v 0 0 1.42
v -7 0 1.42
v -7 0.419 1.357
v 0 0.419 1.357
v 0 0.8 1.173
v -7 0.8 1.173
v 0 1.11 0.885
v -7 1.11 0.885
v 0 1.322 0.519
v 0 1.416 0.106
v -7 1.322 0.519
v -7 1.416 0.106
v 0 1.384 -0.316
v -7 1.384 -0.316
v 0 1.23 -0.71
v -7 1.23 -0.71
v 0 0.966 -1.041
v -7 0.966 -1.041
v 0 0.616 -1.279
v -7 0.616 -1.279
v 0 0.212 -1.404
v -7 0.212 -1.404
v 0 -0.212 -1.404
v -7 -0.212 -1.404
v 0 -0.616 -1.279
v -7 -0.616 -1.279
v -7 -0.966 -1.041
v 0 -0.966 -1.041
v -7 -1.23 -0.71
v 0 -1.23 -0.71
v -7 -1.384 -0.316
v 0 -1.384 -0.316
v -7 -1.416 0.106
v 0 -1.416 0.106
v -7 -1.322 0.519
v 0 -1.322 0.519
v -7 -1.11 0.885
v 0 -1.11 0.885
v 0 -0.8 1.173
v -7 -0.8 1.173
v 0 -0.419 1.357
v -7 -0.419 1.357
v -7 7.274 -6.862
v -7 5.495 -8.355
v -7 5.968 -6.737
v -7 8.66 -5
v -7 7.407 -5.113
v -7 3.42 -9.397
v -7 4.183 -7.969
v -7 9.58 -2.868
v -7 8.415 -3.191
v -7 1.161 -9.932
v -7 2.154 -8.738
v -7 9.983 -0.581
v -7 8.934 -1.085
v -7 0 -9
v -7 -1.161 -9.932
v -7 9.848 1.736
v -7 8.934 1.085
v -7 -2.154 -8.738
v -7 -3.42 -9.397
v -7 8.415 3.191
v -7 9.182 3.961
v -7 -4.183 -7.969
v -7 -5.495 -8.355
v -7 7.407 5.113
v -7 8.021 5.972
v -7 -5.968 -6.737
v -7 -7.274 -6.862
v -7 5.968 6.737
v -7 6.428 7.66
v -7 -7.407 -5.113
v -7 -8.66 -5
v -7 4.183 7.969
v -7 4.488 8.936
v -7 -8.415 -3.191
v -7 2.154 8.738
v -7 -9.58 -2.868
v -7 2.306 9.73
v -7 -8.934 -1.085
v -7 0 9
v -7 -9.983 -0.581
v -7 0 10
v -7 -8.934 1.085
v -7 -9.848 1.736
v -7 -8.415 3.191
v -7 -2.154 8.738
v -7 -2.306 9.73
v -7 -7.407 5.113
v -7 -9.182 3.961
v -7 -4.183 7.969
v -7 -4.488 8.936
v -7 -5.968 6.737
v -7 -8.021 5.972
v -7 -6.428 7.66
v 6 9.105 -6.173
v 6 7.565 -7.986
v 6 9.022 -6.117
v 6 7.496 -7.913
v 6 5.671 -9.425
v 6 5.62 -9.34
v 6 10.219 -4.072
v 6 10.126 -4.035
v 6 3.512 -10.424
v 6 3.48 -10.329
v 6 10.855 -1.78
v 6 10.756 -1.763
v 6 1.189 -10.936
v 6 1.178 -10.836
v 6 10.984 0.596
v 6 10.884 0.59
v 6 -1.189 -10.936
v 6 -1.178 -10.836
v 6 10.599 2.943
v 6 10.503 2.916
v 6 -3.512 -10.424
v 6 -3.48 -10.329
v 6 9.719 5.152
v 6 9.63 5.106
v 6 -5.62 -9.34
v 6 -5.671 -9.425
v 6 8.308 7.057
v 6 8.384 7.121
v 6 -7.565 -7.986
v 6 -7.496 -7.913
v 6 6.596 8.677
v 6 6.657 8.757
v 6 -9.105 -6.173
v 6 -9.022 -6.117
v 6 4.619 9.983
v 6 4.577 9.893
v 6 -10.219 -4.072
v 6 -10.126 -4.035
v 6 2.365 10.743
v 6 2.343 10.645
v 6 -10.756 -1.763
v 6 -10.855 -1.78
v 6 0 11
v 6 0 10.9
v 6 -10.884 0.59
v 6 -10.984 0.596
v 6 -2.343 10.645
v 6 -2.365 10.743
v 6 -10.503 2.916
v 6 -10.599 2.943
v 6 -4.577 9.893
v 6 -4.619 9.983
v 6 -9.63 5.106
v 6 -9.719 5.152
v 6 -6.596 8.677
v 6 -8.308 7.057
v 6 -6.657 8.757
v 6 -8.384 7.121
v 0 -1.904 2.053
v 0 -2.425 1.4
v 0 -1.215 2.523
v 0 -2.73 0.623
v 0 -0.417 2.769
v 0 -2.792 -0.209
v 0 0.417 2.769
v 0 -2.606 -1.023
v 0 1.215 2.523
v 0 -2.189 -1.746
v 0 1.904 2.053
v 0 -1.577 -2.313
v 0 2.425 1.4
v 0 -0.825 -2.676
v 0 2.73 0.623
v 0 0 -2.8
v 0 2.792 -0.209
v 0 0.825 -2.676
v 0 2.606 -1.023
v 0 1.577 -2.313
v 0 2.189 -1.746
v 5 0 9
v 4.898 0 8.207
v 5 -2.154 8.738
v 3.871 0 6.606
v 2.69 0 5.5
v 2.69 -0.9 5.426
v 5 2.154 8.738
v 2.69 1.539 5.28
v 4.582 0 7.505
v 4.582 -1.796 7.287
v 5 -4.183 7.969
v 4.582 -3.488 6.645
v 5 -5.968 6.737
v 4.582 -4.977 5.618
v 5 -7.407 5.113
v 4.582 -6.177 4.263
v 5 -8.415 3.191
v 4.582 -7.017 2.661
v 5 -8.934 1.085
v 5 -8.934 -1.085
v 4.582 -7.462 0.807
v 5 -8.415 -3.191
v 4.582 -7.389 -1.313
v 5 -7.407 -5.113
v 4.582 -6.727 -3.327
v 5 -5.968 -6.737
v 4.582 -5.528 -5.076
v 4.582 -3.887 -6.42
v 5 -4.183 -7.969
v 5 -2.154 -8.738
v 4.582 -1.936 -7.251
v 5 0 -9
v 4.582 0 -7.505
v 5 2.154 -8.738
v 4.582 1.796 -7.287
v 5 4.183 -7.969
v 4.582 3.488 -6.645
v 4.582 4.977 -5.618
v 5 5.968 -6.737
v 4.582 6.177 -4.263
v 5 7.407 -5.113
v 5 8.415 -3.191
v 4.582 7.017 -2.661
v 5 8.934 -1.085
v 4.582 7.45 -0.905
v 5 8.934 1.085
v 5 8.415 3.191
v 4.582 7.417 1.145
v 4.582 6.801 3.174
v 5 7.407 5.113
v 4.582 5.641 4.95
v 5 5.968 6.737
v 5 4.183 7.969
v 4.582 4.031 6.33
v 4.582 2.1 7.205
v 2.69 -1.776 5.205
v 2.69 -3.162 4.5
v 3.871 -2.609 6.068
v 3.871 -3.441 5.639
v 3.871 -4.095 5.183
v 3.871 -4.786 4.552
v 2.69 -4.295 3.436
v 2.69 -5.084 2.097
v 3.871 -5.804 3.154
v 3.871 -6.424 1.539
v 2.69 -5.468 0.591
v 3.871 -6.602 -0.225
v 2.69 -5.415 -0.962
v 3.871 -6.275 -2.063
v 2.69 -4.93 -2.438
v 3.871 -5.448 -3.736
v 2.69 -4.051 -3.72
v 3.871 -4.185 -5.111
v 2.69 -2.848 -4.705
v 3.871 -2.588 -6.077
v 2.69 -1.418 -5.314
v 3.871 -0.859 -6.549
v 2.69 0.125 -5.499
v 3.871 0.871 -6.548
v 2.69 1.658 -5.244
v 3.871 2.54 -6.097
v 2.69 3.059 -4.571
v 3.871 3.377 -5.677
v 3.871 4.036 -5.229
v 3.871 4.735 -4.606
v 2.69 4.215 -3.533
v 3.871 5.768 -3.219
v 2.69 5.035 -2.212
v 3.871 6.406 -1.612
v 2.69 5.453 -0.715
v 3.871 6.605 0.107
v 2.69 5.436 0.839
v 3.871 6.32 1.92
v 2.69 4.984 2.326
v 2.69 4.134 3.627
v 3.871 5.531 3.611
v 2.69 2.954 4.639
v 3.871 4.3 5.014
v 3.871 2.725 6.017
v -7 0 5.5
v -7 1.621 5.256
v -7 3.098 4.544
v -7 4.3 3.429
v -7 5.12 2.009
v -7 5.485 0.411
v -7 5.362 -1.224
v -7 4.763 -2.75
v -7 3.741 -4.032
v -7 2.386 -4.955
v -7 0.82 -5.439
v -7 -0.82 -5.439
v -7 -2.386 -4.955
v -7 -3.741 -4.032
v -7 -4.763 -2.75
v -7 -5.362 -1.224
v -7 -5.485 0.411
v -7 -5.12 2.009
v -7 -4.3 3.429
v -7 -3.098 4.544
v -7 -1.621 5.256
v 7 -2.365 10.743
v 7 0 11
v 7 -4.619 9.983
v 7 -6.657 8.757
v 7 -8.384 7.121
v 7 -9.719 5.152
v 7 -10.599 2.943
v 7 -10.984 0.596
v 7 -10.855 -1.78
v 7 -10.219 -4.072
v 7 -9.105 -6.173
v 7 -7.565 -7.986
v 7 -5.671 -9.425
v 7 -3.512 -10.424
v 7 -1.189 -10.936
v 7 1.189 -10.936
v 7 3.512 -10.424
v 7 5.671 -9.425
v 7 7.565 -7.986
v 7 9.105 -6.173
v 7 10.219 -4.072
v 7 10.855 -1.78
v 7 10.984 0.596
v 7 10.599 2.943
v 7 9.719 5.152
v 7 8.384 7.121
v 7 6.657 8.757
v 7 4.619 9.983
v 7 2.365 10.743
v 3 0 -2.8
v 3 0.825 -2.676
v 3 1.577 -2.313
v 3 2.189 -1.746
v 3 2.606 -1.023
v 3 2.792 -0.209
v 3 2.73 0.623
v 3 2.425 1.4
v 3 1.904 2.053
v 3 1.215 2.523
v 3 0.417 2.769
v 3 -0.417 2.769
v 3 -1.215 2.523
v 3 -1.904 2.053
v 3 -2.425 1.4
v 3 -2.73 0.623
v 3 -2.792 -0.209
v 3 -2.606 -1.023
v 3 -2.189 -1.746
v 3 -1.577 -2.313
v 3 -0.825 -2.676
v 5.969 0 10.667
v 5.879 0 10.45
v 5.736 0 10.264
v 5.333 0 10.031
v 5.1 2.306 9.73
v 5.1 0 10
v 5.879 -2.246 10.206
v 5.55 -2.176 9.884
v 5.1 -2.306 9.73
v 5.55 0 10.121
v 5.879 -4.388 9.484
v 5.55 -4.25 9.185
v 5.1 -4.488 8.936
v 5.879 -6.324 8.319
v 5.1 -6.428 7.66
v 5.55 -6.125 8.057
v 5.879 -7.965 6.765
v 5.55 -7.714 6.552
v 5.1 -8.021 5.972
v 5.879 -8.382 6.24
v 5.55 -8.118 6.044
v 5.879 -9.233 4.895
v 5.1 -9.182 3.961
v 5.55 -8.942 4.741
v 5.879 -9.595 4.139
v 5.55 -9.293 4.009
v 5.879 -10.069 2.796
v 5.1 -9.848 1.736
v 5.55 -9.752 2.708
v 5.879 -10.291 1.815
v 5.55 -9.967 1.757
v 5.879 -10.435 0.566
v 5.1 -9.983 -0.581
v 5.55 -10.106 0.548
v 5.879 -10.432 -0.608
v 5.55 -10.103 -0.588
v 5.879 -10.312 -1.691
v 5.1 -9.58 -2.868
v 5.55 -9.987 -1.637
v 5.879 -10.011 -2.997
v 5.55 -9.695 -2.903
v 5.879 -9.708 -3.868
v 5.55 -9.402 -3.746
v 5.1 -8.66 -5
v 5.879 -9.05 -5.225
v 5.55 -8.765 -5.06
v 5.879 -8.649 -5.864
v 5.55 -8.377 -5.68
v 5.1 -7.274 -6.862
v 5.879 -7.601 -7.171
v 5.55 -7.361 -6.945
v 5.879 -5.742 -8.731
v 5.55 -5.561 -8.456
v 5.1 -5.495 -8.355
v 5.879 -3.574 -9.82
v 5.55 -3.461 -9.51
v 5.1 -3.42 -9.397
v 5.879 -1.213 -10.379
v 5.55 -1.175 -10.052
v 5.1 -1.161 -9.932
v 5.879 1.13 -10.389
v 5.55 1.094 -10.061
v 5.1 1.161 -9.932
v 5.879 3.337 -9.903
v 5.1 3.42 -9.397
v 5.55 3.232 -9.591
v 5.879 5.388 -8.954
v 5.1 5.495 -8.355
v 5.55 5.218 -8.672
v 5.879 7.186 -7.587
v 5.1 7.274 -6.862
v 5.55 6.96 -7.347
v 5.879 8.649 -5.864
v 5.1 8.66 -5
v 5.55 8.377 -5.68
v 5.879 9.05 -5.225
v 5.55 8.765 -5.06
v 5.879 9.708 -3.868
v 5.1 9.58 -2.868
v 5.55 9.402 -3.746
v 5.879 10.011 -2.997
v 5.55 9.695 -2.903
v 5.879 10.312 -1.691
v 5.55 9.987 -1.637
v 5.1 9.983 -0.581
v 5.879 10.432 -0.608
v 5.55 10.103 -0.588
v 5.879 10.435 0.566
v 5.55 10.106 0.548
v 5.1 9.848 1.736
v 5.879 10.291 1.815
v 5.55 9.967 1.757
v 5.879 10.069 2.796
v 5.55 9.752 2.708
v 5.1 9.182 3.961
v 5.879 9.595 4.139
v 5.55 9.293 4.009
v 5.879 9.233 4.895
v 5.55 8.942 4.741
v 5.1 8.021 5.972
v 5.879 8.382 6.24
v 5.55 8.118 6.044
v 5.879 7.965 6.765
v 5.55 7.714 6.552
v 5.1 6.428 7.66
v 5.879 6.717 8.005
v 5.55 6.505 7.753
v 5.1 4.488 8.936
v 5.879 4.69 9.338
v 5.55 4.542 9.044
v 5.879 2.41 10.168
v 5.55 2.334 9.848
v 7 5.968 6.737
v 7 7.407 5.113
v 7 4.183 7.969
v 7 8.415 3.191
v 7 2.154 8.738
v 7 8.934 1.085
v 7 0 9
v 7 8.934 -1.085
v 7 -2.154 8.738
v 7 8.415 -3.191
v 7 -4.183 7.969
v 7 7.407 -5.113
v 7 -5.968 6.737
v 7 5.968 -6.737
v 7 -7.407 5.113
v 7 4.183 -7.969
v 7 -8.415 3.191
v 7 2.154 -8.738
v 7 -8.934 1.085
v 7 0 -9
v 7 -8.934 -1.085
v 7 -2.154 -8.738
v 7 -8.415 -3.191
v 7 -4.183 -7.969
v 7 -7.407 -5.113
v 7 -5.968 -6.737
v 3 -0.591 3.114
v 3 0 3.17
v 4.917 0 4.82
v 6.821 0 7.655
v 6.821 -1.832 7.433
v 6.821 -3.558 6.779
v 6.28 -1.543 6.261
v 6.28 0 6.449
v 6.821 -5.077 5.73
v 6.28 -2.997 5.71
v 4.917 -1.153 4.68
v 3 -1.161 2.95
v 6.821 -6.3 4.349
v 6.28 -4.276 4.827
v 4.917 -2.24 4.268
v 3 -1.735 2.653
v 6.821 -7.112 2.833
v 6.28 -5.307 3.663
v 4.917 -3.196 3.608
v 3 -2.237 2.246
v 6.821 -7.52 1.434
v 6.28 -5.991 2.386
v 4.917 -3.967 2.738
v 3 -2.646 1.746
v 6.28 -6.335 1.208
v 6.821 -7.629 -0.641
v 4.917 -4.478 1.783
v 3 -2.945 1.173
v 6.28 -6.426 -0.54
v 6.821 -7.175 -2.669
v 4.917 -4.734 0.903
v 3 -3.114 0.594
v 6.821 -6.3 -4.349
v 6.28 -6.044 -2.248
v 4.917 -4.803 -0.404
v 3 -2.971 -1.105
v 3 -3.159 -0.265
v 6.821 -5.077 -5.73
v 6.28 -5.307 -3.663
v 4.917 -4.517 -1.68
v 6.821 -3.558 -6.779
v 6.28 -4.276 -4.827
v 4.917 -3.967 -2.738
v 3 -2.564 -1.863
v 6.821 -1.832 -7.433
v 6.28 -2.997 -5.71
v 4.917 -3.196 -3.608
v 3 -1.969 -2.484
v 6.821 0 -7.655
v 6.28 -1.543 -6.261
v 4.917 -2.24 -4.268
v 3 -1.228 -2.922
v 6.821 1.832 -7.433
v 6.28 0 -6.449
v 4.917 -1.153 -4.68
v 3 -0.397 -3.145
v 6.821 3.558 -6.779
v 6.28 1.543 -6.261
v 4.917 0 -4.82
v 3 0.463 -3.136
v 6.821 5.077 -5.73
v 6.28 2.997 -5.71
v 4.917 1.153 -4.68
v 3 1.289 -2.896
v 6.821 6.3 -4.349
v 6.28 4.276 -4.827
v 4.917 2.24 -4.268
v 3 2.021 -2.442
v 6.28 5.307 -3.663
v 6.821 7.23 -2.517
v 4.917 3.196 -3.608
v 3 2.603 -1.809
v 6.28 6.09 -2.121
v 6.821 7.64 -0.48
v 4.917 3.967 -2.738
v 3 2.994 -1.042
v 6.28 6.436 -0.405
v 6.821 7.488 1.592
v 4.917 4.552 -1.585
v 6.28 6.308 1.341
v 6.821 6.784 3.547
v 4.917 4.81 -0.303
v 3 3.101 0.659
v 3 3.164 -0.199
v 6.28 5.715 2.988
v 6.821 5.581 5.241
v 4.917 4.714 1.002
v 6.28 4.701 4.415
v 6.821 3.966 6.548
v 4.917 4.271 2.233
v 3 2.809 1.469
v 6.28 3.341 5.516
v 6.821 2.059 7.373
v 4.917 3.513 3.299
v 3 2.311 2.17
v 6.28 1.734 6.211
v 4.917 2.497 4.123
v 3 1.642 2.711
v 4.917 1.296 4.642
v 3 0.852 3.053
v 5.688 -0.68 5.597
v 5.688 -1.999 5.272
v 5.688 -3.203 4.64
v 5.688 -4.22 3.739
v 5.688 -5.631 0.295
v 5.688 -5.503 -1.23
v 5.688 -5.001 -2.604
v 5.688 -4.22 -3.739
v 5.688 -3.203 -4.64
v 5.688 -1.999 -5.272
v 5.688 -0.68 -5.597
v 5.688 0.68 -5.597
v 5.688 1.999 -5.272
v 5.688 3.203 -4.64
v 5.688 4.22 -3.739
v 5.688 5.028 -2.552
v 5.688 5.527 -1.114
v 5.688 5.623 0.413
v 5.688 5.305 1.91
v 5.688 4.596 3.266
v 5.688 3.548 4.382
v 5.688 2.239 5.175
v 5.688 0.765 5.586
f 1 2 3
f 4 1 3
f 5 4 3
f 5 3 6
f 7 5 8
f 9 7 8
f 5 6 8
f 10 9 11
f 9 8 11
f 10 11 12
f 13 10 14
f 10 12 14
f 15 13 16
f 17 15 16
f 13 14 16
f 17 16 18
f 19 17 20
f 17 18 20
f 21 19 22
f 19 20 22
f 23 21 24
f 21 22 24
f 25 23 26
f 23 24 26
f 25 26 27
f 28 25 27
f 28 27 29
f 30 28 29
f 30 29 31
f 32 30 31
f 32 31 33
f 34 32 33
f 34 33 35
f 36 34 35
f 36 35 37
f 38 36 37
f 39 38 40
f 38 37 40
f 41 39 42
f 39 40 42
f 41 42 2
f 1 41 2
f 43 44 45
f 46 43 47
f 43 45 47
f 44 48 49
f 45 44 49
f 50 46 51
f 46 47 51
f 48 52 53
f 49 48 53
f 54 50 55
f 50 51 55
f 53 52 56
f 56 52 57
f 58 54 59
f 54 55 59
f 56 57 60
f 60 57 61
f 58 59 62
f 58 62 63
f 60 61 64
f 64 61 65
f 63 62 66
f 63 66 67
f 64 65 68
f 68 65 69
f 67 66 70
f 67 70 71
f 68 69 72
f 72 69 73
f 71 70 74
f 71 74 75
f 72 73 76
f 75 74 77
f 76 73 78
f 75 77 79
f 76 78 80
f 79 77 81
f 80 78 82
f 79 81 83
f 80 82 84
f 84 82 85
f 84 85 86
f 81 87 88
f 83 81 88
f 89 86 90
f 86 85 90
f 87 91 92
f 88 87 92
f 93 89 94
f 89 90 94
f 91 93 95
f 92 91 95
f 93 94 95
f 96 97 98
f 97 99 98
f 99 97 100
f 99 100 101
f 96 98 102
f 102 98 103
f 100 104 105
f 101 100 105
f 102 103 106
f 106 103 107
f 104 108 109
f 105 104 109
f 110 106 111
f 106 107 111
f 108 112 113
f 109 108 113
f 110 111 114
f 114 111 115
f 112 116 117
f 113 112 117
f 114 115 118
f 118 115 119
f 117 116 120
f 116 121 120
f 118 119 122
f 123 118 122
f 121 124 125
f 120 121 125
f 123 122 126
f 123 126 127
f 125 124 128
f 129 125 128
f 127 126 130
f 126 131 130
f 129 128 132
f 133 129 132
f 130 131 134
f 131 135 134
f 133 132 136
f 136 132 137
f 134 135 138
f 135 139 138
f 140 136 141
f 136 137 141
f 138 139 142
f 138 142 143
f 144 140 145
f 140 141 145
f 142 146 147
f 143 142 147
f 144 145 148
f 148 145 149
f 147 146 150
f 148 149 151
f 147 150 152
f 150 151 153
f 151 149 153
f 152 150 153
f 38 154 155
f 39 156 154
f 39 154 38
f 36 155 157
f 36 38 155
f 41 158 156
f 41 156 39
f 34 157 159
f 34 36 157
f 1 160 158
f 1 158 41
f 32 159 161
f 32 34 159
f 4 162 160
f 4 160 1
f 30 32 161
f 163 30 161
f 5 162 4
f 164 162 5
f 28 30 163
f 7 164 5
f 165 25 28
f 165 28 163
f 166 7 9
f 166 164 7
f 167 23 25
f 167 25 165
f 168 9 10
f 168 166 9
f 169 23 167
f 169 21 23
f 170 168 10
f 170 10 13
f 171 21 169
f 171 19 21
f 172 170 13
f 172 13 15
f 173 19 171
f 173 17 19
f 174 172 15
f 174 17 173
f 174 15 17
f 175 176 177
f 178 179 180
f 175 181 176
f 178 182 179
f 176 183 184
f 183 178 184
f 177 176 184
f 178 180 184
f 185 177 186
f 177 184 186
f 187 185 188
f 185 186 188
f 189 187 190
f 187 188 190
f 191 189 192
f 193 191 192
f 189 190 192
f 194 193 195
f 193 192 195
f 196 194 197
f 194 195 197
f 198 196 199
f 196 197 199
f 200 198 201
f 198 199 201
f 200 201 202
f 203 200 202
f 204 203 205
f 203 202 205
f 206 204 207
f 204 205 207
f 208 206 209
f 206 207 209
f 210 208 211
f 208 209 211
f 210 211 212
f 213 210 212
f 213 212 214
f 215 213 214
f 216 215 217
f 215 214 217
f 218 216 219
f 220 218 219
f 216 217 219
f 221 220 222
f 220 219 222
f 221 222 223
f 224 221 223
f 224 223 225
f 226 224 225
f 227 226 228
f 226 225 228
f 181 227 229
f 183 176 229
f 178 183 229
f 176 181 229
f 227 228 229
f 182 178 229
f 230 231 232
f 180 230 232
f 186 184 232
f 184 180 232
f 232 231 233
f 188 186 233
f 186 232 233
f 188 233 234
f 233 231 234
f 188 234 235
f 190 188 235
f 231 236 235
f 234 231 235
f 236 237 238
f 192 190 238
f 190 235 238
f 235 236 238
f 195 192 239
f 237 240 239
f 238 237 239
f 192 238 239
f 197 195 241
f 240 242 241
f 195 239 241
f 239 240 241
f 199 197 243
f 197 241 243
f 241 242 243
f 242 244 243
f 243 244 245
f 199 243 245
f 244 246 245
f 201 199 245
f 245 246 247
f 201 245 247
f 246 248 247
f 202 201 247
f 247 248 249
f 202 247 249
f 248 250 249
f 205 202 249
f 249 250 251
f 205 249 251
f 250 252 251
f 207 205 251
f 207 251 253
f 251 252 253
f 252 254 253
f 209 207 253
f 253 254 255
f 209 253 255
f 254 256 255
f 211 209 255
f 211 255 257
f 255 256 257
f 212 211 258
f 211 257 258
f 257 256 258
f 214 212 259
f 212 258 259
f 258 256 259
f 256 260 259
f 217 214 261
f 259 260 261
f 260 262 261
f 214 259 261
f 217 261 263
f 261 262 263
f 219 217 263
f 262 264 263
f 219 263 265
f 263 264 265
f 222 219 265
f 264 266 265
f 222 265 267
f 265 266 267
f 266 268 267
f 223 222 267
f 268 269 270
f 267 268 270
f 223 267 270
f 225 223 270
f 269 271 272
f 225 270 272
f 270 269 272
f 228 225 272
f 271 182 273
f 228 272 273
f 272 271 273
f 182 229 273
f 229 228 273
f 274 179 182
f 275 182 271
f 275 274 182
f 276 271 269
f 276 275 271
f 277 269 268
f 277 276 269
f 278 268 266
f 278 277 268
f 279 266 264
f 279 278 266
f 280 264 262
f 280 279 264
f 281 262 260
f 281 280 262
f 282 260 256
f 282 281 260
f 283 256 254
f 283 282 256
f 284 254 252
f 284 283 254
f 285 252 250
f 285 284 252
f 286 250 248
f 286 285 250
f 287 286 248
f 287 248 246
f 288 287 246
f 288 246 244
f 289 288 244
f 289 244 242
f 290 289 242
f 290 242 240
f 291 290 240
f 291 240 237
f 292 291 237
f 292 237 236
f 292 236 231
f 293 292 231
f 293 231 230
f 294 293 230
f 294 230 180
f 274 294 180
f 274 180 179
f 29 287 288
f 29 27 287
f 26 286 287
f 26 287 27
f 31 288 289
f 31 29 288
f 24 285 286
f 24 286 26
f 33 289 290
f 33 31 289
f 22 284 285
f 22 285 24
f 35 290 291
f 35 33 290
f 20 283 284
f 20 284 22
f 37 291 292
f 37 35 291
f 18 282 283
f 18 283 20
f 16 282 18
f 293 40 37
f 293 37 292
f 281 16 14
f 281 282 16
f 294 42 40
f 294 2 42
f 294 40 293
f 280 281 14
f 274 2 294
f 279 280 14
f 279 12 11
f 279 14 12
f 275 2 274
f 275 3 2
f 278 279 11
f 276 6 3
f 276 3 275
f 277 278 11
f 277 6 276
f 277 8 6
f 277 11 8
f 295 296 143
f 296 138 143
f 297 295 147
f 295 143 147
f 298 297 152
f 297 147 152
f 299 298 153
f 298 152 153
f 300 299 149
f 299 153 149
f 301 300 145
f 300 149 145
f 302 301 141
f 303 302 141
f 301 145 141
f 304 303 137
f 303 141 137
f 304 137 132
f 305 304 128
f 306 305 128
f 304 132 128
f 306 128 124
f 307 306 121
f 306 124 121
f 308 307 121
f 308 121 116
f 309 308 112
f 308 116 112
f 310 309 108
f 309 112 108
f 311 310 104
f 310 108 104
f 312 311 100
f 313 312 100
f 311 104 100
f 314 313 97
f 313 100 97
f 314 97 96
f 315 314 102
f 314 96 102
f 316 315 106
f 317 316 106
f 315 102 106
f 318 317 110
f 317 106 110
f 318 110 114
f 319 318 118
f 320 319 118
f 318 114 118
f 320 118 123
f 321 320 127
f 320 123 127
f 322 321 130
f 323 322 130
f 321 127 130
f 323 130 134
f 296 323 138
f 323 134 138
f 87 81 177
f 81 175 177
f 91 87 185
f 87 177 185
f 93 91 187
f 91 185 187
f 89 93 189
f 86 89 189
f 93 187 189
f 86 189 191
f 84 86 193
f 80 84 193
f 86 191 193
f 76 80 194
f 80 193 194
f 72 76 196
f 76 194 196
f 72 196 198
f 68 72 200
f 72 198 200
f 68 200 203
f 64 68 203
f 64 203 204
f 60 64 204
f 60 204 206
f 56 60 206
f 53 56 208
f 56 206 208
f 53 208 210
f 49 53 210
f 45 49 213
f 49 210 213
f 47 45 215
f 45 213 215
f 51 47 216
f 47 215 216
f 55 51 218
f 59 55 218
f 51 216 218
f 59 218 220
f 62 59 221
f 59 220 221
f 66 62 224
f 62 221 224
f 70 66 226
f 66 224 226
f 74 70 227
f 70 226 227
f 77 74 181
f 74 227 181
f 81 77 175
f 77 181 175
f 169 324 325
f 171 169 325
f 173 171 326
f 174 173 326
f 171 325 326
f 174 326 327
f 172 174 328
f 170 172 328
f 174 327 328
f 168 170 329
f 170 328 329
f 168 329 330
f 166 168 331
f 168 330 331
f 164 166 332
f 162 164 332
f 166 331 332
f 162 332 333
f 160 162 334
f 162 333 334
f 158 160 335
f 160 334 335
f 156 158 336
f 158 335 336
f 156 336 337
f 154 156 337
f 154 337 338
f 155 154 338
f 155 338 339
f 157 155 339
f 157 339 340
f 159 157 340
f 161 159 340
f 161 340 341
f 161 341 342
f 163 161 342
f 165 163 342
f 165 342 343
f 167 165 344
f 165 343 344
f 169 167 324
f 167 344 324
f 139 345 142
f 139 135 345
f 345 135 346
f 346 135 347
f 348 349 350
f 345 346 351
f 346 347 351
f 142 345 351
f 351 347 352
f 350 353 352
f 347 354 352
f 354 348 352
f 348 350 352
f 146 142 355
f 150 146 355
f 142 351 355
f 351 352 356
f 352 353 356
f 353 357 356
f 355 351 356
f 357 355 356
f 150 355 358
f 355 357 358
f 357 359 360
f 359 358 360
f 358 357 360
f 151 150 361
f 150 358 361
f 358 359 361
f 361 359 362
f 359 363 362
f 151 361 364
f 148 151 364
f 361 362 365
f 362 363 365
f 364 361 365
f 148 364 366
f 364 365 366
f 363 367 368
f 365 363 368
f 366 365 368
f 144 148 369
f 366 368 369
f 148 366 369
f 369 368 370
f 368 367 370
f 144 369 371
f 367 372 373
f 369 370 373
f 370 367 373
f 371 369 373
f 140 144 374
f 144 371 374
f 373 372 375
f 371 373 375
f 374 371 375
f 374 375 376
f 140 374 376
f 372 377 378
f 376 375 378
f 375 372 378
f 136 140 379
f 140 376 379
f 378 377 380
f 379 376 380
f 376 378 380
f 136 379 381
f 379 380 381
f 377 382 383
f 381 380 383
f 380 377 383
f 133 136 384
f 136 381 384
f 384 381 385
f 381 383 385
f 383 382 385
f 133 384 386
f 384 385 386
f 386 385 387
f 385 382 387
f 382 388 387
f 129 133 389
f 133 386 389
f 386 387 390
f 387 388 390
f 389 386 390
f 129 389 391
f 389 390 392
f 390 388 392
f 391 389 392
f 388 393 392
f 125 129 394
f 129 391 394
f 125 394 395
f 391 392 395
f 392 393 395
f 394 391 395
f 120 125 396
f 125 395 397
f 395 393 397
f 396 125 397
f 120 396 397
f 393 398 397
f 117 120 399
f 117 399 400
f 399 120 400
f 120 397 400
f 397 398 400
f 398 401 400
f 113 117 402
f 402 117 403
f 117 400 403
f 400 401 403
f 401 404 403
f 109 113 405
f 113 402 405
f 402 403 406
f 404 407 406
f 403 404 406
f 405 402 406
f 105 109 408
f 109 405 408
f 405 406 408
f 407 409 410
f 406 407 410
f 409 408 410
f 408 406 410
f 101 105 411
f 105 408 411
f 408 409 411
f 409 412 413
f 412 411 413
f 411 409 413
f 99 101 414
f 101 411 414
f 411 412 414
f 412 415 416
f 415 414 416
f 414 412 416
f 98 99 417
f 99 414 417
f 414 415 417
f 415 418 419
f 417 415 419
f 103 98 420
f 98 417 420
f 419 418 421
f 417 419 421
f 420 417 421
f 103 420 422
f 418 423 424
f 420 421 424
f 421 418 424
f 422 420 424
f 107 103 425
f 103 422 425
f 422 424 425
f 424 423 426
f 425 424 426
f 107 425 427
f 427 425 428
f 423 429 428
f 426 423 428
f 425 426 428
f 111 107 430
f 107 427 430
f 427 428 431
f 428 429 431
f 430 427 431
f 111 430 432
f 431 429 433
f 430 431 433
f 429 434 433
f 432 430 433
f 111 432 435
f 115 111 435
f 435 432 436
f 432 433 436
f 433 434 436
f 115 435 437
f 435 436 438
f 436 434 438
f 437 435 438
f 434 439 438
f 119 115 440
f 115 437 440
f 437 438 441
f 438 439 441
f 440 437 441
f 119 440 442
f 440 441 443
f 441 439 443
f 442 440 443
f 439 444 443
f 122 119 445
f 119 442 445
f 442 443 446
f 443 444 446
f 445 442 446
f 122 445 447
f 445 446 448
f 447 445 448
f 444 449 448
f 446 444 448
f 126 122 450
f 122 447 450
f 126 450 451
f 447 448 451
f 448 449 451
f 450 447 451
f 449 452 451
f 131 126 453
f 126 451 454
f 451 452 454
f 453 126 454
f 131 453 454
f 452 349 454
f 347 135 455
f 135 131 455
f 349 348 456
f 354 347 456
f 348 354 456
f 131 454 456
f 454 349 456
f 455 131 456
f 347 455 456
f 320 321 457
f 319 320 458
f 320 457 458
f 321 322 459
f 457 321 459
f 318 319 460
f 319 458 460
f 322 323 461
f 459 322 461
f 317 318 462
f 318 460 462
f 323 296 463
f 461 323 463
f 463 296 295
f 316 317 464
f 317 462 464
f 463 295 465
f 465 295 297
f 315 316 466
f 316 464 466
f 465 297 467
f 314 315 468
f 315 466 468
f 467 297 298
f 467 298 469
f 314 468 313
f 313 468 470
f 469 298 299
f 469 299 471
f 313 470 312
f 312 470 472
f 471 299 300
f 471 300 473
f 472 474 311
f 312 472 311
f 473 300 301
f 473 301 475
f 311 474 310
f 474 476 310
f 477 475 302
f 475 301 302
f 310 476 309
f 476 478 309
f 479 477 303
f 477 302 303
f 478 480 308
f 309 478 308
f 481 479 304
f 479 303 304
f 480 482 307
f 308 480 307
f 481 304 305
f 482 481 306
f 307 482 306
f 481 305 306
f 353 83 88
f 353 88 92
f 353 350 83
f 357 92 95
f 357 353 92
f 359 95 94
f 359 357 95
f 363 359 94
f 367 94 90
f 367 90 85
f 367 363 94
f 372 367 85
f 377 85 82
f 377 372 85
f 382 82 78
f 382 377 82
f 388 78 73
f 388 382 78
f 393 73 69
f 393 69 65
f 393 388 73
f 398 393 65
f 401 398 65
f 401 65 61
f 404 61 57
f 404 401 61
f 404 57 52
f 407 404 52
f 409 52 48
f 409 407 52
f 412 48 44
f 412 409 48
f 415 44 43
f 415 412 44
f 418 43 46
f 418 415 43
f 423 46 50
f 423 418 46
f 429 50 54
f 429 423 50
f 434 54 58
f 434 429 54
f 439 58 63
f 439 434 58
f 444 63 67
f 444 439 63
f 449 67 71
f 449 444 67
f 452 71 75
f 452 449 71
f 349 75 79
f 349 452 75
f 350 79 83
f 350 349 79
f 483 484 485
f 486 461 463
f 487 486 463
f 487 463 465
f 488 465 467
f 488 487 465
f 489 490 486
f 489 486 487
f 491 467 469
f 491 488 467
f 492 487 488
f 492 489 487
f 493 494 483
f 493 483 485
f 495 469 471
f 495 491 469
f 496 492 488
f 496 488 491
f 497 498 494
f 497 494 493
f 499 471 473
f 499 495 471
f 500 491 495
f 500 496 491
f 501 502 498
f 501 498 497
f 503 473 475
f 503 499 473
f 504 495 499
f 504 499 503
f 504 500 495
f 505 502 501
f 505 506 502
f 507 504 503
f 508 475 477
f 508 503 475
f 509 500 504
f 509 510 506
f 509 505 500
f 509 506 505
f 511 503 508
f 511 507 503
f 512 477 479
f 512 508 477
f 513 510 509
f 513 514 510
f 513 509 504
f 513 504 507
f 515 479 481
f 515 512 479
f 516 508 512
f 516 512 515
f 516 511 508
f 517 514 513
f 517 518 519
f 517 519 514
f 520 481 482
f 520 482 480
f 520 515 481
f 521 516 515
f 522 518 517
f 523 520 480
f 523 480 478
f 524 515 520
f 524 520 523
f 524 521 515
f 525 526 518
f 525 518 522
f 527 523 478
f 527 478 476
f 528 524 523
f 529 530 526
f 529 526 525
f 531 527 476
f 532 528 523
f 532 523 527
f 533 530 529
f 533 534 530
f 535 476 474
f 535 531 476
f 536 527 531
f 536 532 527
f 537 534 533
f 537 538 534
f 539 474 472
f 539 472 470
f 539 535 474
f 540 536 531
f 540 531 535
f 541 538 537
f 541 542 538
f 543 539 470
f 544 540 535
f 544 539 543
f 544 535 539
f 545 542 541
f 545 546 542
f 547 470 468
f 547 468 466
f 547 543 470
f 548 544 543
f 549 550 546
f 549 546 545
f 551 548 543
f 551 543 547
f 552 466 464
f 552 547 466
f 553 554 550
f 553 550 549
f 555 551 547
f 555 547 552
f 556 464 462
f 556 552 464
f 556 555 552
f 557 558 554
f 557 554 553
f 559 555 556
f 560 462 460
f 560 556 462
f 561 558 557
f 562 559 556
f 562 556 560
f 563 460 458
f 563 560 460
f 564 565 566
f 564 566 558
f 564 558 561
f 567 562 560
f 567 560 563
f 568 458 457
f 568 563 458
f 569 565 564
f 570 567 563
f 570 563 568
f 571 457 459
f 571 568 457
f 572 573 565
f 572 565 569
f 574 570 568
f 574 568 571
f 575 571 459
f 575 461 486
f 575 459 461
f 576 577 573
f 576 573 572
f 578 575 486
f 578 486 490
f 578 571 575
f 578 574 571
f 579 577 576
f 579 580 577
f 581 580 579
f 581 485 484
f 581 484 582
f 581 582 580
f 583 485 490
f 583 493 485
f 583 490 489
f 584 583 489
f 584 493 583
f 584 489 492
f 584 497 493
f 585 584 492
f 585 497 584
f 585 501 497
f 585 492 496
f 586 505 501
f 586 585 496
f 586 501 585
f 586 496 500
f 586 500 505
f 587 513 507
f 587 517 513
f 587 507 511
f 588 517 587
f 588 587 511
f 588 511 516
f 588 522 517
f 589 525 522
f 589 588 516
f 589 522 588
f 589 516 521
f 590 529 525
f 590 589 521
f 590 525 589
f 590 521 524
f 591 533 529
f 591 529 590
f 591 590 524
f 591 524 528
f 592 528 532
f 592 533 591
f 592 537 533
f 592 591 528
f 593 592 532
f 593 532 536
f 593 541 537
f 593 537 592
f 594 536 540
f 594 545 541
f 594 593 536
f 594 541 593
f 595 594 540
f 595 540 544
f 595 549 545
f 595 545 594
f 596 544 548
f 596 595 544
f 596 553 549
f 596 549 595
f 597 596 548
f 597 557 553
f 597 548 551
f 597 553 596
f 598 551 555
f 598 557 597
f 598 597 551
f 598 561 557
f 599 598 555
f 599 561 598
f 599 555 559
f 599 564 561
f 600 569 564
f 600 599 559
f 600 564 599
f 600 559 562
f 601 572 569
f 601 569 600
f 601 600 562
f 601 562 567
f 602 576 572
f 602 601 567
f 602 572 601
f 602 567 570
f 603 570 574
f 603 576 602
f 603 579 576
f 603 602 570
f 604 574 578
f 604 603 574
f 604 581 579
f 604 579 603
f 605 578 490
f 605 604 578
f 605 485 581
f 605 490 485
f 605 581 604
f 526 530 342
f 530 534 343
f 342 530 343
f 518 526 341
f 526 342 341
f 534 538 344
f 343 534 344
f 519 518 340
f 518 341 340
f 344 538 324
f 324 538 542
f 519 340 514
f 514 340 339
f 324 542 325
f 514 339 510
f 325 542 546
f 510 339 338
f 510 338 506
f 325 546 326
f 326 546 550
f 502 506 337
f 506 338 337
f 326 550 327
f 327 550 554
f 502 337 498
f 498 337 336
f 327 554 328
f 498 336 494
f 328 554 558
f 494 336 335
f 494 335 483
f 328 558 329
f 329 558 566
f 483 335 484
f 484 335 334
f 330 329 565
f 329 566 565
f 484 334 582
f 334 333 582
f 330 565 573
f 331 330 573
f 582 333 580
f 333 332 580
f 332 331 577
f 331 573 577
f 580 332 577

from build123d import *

# Parameters (mm, degrees)
SKETCH2_R           = 5.5
SKETCH2_R_2         = 1
BOSS_EXTRUDE1_DEPTH = 10
SKETCH3_R           = 2.8
CUT_EXTRUDE1_DEPTH  = 3
SKETCH4_R           = 1.42
CUT_EXTRUDE2_DEPTH  = 7
SKETCH5_R           = 22.131734032
SKETCH5_R_2         = 10
CUT_EXTRUDE3_DEPTH  = 10


with BuildPart() as part:
    # Sketch1 → Revolve1 (revolve)
    with BuildSketch(Plane.XY, mode=Mode.PRIVATE) as revolve1_sk:
        with BuildLine():
            Line((-7, 9), (5, 9))
            add(Edge.make_bspline(
                [(5, 9), (5, 8.856466181), (4.980630385, 8.552638111), (4.879856885, 8.085906437), (4.637540593, 7.528306389), (3.996049584, 6.69016035), (2.86097235, 5.618747783), (1.478465211, 4.503997435), (0.514957064, 3.794701588), (0.068439653, 3.476275963), (0, 3.427716912)],
                knots=[0, 0, 0, 0, 0.0625, 0.125, 0.25, 0.375, 0.5, 0.625, 0.75, 0.773497894, 0.773497894, 0.773497894, 0.773497894], degree=3))
            Line((0, 3.427716912), (0, 1))
            add(Edge.make_bspline(
                [(7, 9), (7, 7.437991686), (5.451200792, 4.581787455), (0.00160793, 1.001387392), (0, 1)],
                knots=[0, 0, 0, 0, 0.405901642, 1, 1, 1, 1], degree=3))
            Line((7, 9), (7, 11))
            Line((7, 11), (6, 11))
            Line((6, 11), (6, 10.9))
            ThreePointArc((6, 10.9), (5.736396103, 10.263603897), (5.1, 10))
            Line((5.1, 10), (-5.1, 10))
            ThreePointArc((-5.1, 10), (-5.736396103, 10.263603897), (-6, 10.9))
            Line((-6, 10.9), (-6, 11))
            Line((-6, 11), (-7, 11))
            Line((-7, 11), (-7, 9))
        make_face()
    revolve(revolve1_sk.sketch.rotate(Axis((0, 0, 0), (1, 0, 0)), 90), axis=Axis((0, 0, 0), (1, 0, 0)))

    # Sketch2 → Boss-Extrude1 (add)
    with BuildSketch(Plane.ZY.offset(7)):
        Circle(SKETCH2_R)
        Circle(SKETCH2_R_2, mode=Mode.SUBTRACT)
    extrude(amount=-BOSS_EXTRUDE1_DEPTH)

    # Sketch3 → Cut-Extrude1 (cut)
    with BuildSketch(Plane(origin=(3, 0, 0), x_dir=(0, 0, -1), z_dir=(1, 0, 0))):
        Circle(SKETCH3_R)
    extrude(amount=-CUT_EXTRUDE1_DEPTH, mode=Mode.SUBTRACT)

    # Sketch4 → Cut-Extrude2 (cut)
    with BuildSketch(Plane.ZY.offset(7)):
        Circle(SKETCH4_R)
    extrude(amount=-CUT_EXTRUDE2_DEPTH, mode=Mode.SUBTRACT)

    # Sketch5 → Cut-Extrude3 (cut)
    with BuildSketch(Plane(origin=(0, 0, 0), x_dir=(0, 0, -1), z_dir=(1, 0, 0))):
        Circle(SKETCH5_R)
        with Locations(Location((0, 0, 0), (0, 0, 180))):
            Circle(SKETCH5_R_2, mode=Mode.SUBTRACT)
    extrude(amount=-CUT_EXTRUDE3_DEPTH, mode=Mode.SUBTRACT)


solid = part.part
